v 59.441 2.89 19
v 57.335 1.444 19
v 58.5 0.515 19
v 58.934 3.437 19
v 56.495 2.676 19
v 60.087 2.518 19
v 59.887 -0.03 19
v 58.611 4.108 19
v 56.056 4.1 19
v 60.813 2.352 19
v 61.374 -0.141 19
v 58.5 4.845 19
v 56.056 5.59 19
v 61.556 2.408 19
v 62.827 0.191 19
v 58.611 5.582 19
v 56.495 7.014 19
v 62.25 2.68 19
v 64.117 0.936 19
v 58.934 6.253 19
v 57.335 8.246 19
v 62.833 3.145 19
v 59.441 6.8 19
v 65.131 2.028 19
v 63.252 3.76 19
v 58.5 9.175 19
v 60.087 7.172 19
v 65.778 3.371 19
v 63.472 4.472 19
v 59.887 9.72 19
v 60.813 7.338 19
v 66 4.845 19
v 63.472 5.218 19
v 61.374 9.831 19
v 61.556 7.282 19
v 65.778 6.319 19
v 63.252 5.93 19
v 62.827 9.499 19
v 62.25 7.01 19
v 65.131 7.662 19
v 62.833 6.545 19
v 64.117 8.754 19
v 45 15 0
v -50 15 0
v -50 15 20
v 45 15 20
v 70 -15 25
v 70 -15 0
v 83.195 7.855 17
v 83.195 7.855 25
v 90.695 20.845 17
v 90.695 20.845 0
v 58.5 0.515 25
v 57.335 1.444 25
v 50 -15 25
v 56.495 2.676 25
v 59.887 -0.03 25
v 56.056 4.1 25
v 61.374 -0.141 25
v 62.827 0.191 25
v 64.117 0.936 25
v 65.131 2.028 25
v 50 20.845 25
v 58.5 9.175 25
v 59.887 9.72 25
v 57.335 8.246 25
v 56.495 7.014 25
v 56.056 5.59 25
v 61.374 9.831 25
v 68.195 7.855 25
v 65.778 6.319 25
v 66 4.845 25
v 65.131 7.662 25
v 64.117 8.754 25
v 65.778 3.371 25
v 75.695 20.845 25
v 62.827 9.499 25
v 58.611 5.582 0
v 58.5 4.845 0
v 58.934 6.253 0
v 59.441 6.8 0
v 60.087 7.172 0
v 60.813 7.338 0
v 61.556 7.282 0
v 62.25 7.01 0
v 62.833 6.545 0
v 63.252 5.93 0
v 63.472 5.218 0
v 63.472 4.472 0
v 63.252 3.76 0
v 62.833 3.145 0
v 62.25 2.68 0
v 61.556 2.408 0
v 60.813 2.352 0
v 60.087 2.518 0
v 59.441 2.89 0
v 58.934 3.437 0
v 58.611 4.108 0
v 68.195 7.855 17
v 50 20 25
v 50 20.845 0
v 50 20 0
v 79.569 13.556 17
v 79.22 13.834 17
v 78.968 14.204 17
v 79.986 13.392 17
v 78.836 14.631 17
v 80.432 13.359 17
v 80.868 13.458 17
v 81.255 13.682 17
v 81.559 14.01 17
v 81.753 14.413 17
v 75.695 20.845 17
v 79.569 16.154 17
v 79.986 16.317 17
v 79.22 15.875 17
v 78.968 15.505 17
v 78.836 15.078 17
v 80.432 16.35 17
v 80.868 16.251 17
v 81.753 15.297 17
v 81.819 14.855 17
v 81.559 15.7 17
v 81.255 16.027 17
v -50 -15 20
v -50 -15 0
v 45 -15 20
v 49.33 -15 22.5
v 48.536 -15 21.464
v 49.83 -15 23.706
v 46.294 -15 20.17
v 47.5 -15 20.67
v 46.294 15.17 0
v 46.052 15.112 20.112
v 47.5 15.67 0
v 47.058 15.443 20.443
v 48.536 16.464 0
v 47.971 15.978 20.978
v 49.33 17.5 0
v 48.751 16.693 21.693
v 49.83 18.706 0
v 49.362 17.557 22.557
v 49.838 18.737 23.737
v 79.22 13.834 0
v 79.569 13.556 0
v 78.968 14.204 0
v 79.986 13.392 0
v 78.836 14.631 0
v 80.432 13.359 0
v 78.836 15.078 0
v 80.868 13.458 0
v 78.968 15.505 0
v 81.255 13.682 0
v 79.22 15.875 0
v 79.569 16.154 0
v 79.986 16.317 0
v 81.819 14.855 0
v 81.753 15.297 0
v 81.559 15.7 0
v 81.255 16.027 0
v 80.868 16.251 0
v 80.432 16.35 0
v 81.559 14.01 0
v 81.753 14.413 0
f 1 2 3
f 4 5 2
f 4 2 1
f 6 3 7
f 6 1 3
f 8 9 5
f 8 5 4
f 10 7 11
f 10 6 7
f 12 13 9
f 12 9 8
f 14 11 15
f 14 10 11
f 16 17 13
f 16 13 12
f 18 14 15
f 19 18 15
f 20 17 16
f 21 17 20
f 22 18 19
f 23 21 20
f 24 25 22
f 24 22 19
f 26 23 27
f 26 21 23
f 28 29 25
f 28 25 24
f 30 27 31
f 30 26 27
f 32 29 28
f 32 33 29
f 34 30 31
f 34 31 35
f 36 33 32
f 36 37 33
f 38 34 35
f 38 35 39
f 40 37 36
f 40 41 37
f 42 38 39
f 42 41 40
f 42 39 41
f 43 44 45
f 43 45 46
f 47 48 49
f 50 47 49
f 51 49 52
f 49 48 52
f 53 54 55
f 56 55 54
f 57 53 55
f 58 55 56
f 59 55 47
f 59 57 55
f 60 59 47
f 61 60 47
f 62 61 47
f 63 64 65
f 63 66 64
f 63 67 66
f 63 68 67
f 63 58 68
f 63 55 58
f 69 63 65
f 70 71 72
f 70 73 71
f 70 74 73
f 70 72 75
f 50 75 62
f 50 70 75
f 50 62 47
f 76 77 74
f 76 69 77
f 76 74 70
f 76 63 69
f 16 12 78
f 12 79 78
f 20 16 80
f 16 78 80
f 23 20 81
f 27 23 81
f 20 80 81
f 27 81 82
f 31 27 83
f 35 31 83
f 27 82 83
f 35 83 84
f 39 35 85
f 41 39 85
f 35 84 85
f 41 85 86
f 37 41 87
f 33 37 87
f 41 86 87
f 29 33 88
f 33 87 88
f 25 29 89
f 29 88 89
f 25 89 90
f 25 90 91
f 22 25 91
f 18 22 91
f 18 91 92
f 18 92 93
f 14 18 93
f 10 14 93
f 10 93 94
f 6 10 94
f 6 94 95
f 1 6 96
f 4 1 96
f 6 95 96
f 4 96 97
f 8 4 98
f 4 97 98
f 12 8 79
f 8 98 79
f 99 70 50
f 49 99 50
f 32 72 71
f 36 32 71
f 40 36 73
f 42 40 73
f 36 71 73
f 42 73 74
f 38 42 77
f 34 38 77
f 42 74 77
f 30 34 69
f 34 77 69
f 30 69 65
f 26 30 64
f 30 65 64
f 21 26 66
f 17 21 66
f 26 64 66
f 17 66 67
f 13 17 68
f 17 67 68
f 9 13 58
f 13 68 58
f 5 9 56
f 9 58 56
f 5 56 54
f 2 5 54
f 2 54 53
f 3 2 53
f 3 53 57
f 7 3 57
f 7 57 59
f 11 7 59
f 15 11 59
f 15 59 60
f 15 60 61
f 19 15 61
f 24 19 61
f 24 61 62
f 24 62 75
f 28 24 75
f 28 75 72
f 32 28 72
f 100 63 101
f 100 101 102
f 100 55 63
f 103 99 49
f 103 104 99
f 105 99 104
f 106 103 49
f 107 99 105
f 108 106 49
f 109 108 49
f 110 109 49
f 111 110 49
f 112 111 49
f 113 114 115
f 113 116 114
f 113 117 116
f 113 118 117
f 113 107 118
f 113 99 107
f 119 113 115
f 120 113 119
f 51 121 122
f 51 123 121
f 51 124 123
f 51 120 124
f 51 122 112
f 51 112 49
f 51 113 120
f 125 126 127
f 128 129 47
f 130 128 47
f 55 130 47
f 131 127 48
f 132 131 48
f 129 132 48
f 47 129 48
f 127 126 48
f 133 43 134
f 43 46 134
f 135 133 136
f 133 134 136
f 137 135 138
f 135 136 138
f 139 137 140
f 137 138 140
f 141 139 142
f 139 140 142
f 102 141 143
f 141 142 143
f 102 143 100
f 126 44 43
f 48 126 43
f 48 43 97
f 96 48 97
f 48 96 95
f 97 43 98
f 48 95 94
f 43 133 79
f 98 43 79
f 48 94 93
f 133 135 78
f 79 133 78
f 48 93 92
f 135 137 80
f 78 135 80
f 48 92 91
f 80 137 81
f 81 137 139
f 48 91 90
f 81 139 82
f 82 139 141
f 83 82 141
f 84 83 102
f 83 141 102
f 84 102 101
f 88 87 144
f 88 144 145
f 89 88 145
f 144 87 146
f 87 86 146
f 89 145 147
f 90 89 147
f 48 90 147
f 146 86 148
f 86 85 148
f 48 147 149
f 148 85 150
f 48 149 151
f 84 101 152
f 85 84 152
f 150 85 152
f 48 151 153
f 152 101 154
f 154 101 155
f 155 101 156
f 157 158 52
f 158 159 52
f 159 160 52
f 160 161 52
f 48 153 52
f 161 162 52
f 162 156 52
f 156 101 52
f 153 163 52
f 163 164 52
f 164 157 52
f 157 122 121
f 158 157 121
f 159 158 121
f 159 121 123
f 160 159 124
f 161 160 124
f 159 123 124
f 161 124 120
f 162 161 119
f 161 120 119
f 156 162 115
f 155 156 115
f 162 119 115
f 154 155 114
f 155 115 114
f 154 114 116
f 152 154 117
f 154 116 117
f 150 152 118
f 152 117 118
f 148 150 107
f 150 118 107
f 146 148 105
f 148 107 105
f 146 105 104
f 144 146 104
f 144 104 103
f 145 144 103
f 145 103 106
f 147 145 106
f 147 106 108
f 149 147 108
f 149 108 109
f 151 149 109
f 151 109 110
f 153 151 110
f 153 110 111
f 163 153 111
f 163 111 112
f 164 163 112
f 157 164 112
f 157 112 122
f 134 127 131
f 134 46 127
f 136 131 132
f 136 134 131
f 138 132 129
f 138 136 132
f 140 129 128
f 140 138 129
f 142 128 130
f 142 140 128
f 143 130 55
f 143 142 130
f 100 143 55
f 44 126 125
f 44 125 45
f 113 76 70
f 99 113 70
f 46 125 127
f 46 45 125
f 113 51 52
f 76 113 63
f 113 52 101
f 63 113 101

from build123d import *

# Parameters (mm, degrees)
SKETCH_1_W                = 100
SKETCH_1_H                = 30
EXTRUDE_1_DEPTH           = 20
EXTRUDE_2_DEPTH           = 5
EXTRUDE_2_DEPTH_BACK      = 20
FILLET_1_R                = 5
CUT_EXTRUDE_1_DEPTH       = 8
SKETCH_4_R                = 1.5
CUT_EXTRUDE_2_DEPTH       = 95.599814737
HOLE_WIZARD_1_D           = 5
HOLE_WIZARD_1_CBORE_D     = 10
HOLE_WIZARD_1_CBORE_DEPTH = 6


with BuildPart() as part:
    # 草图1 → 凸台-拉伸1 (new body)
    with BuildSketch(Plane.XY):
        Rectangle(SKETCH_1_W, SKETCH_1_H)
    extrude(amount=EXTRUDE_1_DEPTH)

    # 草图2 → 凸台-拉伸2 (add, two sides: drawn at the far end of the back side and taken through both)
    with BuildSketch(Plane.XY.offset(20).offset(-EXTRUDE_2_DEPTH_BACK)):
        Polygon((50, -15), (70, -15), (90.695144291, 20.845041382), (50, 20.845041382), align=None)
    extrude(amount=EXTRUDE_2_DEPTH + EXTRUDE_2_DEPTH_BACK)

    # 圆角1
    fillet_1_edges = [part.edges().sort_by_distance(p)[0] for p in [
        (50, 15, 10),
        (50, 0, 20),
    ]]
    fillet(fillet_1_edges, radius=FILLET_1_R - 0.0001)  # a hair under: the kernel refuses the full size

    # 草图3 → 切除-拉伸1 (cut)
    with BuildSketch(Plane.XY.offset(25)):
        Polygon((75.695144291, 20.845041382), (68.195144291, 7.854660326), (83.195144291, 7.854660326), (90.695144291, 20.845041382), align=None)
    extrude(amount=-CUT_EXTRUDE_1_DEPTH, mode=Mode.SUBTRACT)

    # 草图4 → 切除-拉伸2 (cut, through all)
    with BuildSketch(Plane.XY.offset(17)):
        with Locations((80.319499944, 14.854660326)):
            Circle(SKETCH_4_R)
    extrude(amount=-CUT_EXTRUDE_2_DEPTH, mode=Mode.SUBTRACT)

    # 孔1 (through all)
    with Locations(Plane(origin=(61, 4.845041382, 25), x_dir=(1, 0, 0), z_dir=(0, 0, 1))):
        with Locations((0, 0)):
            CounterBoreHole(HOLE_WIZARD_1_D / 2, HOLE_WIZARD_1_CBORE_D / 2, HOLE_WIZARD_1_CBORE_DEPTH)


solid = part.part
